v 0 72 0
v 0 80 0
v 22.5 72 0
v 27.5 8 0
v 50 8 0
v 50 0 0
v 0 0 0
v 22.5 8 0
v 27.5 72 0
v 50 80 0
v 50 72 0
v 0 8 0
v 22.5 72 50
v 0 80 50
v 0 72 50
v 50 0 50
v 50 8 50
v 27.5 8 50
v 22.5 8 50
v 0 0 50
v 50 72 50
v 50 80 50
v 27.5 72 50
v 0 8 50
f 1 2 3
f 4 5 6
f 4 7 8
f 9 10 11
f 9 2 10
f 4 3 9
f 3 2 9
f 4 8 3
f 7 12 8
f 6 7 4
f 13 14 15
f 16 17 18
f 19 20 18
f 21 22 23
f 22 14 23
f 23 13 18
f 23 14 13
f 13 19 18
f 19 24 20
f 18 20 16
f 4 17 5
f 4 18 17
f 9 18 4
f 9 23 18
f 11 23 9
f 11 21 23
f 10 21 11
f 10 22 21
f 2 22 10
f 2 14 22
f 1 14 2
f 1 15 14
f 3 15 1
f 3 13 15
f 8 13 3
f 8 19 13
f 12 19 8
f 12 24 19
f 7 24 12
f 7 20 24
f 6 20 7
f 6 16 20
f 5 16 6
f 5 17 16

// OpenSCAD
$fn = 32;

// ----------------------------------------------------------------------
// Structural section: ibeam 50 x 80 mm
// ----------------------------------------------------------------------

// --- parameters (mm) ---
sec_w = 50;               // section width, X
sec_h = 80;               // section height, Y
flange_t = 8;             // flange thickness
web_t = 5;                // web thickness
plate_t = 50;             // cut length, Z (extrusion height)

profile = [[0, 0], [50, 0], [50, 8], [27.5, 8], [27.5, 72], [50, 72], [50, 80], [0, 80], [0, 72], [22.5, 72], [22.5, 8], [0, 8]];  // primary outline, 12 points, counter clockwise

// --- the one profile operation ---
linear_extrude(height = plate_t) polygon(points = profile);
